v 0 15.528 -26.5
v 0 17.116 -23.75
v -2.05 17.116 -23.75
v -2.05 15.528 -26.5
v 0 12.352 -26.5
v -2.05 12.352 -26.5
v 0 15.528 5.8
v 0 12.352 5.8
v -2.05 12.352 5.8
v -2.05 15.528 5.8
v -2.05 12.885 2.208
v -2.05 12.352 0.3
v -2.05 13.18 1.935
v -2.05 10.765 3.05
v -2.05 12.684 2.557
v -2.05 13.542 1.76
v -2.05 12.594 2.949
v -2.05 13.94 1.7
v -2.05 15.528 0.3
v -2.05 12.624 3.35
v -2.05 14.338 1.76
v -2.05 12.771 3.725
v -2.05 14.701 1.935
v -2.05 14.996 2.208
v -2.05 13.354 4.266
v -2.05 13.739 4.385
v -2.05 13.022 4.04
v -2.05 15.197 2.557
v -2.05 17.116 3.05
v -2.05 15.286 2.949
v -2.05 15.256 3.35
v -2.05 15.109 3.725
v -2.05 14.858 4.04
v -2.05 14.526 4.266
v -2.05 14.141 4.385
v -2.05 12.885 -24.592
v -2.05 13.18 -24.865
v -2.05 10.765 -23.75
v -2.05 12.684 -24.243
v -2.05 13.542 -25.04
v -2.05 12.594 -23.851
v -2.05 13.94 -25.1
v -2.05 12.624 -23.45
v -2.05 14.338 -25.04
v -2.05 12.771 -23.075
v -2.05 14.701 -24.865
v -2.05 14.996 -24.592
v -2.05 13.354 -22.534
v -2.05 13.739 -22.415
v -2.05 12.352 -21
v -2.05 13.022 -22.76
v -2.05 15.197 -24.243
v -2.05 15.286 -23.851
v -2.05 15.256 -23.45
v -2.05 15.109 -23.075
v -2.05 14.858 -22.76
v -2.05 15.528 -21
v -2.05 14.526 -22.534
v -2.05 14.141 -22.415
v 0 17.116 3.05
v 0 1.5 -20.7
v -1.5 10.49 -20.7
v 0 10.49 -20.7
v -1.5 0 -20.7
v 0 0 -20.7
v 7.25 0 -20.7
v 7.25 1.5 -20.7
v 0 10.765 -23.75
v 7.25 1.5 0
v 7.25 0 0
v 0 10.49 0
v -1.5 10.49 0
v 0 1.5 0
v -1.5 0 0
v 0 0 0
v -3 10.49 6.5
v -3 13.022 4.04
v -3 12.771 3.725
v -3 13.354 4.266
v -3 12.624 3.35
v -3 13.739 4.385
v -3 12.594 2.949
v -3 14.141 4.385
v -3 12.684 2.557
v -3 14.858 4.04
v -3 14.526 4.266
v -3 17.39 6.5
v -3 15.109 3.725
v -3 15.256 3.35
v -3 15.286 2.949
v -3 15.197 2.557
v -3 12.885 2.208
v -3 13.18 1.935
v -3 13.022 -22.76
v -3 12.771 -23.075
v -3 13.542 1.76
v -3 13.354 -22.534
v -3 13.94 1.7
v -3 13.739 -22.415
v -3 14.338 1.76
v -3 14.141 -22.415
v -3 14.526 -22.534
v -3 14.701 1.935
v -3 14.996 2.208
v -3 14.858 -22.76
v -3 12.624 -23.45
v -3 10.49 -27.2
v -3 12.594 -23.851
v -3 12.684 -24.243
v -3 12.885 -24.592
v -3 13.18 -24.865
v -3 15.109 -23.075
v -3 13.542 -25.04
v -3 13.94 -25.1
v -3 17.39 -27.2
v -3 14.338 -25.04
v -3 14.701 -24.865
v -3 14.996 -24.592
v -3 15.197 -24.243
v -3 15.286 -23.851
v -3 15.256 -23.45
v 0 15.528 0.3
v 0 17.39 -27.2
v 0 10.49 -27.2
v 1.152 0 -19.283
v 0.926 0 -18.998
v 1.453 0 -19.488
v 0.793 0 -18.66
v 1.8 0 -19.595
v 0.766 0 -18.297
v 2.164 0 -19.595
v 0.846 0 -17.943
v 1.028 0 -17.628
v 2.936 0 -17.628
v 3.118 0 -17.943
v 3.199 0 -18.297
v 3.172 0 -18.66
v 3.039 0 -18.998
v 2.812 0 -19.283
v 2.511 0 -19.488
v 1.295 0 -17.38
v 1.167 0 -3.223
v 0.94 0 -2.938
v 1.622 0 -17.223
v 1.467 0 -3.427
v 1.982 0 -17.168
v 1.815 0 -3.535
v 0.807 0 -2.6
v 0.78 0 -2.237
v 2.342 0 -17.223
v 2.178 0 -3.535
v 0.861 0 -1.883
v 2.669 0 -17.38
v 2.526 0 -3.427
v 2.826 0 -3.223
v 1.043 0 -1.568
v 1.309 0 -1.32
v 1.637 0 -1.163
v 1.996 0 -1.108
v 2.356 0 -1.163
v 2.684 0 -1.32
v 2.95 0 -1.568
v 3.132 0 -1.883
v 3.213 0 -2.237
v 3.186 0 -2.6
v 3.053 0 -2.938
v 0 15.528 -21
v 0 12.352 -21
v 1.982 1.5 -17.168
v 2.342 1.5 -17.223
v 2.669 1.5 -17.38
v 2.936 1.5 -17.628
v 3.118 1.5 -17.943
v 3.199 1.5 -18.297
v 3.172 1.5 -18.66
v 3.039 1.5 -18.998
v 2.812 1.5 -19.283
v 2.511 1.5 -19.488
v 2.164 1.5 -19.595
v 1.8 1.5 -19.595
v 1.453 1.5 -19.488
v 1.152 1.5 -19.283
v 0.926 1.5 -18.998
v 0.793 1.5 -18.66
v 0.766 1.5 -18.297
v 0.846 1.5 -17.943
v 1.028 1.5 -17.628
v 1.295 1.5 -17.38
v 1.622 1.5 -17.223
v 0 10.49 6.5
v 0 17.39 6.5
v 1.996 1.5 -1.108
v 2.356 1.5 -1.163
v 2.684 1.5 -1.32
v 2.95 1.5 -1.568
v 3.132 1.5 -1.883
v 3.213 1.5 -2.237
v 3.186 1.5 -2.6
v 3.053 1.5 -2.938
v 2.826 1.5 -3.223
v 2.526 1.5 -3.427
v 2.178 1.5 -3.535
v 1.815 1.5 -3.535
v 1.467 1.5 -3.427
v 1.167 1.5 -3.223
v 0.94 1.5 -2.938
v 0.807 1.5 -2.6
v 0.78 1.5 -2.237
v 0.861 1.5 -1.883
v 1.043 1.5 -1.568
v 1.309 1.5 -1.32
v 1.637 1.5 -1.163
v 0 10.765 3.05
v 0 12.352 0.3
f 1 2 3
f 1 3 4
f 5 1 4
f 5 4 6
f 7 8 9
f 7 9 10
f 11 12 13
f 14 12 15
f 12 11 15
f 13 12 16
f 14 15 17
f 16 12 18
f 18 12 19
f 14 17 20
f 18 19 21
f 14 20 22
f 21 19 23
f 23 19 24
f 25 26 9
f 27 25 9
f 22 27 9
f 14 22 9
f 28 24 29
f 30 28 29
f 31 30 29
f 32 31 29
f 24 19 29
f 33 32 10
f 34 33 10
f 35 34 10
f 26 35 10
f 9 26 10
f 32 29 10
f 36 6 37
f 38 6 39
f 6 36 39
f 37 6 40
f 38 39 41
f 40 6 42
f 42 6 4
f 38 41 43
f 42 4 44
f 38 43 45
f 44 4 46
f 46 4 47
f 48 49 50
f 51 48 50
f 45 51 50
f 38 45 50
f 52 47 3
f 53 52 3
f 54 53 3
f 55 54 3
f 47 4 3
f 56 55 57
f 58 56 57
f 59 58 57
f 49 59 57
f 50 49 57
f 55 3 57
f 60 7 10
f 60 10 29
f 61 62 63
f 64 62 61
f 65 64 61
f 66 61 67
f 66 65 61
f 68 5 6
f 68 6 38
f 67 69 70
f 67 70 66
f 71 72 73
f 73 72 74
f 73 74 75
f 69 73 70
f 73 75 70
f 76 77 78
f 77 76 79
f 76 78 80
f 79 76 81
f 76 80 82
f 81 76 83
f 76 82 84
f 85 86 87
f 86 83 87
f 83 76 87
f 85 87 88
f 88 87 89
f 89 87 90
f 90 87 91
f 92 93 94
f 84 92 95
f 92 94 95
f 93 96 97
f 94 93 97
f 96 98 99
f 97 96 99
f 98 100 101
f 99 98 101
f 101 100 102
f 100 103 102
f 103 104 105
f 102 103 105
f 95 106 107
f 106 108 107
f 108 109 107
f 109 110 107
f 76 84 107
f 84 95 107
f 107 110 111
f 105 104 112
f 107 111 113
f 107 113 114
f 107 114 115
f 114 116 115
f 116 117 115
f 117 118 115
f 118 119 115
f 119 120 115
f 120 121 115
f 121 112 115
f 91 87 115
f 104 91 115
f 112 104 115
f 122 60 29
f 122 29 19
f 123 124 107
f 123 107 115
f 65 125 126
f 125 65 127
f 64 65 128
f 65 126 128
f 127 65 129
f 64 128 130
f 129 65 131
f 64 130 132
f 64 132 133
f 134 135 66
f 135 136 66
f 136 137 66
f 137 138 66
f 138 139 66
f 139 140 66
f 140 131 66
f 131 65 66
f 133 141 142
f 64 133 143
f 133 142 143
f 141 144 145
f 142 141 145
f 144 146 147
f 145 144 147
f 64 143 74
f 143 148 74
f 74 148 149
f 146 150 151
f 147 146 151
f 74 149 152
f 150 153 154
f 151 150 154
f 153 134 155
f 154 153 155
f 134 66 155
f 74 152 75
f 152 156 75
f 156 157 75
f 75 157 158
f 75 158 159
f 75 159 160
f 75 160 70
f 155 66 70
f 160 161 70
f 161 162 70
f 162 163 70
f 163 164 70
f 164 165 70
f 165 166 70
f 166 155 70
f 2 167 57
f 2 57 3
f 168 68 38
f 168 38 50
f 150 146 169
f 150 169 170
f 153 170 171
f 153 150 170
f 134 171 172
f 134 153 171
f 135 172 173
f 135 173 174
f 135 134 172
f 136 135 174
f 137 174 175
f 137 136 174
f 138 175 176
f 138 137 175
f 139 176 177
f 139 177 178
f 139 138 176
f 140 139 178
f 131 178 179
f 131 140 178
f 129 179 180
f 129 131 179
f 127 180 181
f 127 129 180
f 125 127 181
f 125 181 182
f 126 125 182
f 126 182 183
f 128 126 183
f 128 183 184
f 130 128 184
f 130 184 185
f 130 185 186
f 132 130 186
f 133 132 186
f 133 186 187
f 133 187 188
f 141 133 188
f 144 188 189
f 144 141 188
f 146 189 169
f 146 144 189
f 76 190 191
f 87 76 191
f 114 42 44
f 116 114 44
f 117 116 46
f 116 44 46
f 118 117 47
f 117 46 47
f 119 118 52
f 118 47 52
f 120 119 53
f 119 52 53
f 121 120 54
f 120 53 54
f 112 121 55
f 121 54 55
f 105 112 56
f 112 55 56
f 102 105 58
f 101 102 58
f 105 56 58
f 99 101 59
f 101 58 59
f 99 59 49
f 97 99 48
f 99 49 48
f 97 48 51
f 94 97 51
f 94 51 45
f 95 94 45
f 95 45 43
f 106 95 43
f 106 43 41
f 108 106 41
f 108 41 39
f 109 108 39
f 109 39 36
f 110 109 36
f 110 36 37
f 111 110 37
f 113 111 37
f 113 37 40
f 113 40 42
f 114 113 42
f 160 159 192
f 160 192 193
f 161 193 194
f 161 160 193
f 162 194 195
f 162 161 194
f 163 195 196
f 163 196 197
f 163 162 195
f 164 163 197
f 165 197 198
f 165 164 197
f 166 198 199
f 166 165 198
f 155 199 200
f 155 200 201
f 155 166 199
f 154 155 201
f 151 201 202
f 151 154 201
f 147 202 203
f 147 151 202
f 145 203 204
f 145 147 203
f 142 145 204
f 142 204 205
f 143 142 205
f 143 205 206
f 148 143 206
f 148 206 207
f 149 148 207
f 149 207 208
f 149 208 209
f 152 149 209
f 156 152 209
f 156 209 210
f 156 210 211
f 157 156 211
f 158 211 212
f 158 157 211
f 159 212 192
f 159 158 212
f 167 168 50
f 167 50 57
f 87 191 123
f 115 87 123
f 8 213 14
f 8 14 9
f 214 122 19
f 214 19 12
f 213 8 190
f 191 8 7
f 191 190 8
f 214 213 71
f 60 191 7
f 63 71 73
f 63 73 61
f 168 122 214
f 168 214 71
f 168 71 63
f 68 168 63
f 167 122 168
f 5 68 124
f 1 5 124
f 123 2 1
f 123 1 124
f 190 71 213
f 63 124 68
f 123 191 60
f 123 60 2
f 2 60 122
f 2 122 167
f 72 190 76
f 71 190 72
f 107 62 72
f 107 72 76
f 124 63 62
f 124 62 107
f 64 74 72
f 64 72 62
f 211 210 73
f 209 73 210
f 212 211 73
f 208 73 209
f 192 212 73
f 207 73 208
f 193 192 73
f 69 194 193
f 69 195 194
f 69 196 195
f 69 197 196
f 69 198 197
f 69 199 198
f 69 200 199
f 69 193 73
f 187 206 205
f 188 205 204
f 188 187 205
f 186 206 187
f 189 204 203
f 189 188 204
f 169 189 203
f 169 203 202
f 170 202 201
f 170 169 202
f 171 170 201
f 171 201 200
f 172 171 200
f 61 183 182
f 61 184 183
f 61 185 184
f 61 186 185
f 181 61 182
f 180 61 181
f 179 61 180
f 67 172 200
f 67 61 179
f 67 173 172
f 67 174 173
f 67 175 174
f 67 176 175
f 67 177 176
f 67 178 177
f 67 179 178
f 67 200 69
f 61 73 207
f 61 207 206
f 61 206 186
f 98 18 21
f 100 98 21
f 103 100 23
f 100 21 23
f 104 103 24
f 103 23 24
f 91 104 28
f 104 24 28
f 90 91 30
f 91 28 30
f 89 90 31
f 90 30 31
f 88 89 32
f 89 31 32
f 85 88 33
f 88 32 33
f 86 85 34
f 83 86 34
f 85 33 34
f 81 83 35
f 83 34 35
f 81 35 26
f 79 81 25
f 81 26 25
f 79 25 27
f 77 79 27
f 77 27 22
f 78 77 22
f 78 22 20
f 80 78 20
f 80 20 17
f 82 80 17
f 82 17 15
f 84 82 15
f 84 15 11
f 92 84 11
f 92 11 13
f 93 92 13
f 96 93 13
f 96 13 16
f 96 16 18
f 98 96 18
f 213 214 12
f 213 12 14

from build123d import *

# Parameters (mm, degrees)
SKETCH2_W               = 17.75
SKETCH2_H               = 20.7
SKETCH2_R               = 1.22
BOSS_EXTRUDE1_DEPTH     = 1.5
SKETCH12_W              = 20.7
SKETCH12_H              = 1.5
CUT_EXTRUDE2_DEPTH      = 10.5
SKETCH5_W               = 20.7
SKETCH5_H               = 8.940198937
BOSS_EXTRUDE3_DEPTH     = 1.5
SKETCH25_W              = 1.5
SKETCH25_H              = 20.7
BOSS_EXTRUDE5_DEPTH     = 4.5
SKETCH26_W              = 33.7
SKETCH26_H              = 6.9
SKETCH26_R              = 1.35
BOSS_EXTRUDE9_DEPTH     = 3
CUT_EXTRUDE3_DEPTH      = 0.55
CUT_EXTRUDE3_DEPTH_BACK = 1.5


with BuildPart() as part:
    # Sketch2 → Boss-Extrude1 (new body)
    with BuildSketch(Plane(origin=(0, 0, 0), x_dir=(1, 0, 0), z_dir=(0, 1, 0))):
        with Locations((8.875, 10.35)):
            Rectangle(SKETCH2_W, SKETCH2_H)
        with Locations((1.996494824, 2.32830664)):
            Circle(SKETCH2_R, mode=Mode.SUBTRACT)
        with Locations((1.982091411, 18.38849058)):
            Circle(SKETCH2_R, mode=Mode.SUBTRACT)
    extrude(amount=BOSS_EXTRUDE1_DEPTH)

    # Sketch12 → Cut-Extrude2 (cut)
    with BuildSketch(Plane(origin=(17.75, 0, 0), x_dir=(0, 0, -1), z_dir=(1, 0, 0))):
        with Locations((10.35, 0.75)):
            Rectangle(SKETCH12_W, SKETCH12_H)
    extrude(amount=-CUT_EXTRUDE2_DEPTH, mode=Mode.SUBTRACT)

    # Sketch5 → Boss-Extrude3 (add)
    with BuildSketch(Plane.ZY):
        with Locations((-10.35, 4.470099468)):
            Rectangle(SKETCH5_W, SKETCH5_H)
    extrude(amount=BOSS_EXTRUDE3_DEPTH)

    # Sketch25 → Boss-Extrude5 (add)
    with BuildSketch(Plane(origin=(0, 8.940198937, 0), x_dir=(1, 0, 0), z_dir=(0, 1, 0))):
        with Locations((-0.75, 10.35)):
            Rectangle(SKETCH25_W, SKETCH25_H)
    extrude(amount=BOSS_EXTRUDE5_DEPTH)

    # Sketch26 → Boss-Extrude9 (add)
    with BuildSketch(Plane(origin=(0, 0, 0), x_dir=(0, 0, -1), z_dir=(1, 0, 0))):
        with Locations((10.35, 13.940198937)):
            Rectangle(SKETCH26_W, SKETCH26_H)
        with Locations((23.75, 13.940198937)):
            Circle(SKETCH26_R, mode=Mode.SUBTRACT)
        with Locations((-3.05, 13.940198937)):
            Circle(SKETCH26_R, mode=Mode.SUBTRACT)
    extrude(amount=-BOSS_EXTRUDE9_DEPTH)

    # Sketch29 → Cut-Extrude3 (cut, two sides: drawn at the far end of the back side and taken through both)
    with BuildSketch(Plane.ZY.offset(1.5).offset(-CUT_EXTRUDE3_DEPTH_BACK)):
        Polygon((-26.5, 12.352485697), (-23.75, 10.764772456), (-21, 12.352485697), (-21, 15.527912177), (-23.75, 17.115625417), (-26.5, 15.527912177), align=None)
        Polygon((0.3, 12.352485697), (3.05, 10.764772456), (5.8, 12.352485697), (5.8, 15.527912177), (3.05, 17.115625417), (0.3, 15.527912177), align=None)
    extrude(amount=CUT_EXTRUDE3_DEPTH + CUT_EXTRUDE3_DEPTH_BACK, mode=Mode.SUBTRACT)


solid = part.part
